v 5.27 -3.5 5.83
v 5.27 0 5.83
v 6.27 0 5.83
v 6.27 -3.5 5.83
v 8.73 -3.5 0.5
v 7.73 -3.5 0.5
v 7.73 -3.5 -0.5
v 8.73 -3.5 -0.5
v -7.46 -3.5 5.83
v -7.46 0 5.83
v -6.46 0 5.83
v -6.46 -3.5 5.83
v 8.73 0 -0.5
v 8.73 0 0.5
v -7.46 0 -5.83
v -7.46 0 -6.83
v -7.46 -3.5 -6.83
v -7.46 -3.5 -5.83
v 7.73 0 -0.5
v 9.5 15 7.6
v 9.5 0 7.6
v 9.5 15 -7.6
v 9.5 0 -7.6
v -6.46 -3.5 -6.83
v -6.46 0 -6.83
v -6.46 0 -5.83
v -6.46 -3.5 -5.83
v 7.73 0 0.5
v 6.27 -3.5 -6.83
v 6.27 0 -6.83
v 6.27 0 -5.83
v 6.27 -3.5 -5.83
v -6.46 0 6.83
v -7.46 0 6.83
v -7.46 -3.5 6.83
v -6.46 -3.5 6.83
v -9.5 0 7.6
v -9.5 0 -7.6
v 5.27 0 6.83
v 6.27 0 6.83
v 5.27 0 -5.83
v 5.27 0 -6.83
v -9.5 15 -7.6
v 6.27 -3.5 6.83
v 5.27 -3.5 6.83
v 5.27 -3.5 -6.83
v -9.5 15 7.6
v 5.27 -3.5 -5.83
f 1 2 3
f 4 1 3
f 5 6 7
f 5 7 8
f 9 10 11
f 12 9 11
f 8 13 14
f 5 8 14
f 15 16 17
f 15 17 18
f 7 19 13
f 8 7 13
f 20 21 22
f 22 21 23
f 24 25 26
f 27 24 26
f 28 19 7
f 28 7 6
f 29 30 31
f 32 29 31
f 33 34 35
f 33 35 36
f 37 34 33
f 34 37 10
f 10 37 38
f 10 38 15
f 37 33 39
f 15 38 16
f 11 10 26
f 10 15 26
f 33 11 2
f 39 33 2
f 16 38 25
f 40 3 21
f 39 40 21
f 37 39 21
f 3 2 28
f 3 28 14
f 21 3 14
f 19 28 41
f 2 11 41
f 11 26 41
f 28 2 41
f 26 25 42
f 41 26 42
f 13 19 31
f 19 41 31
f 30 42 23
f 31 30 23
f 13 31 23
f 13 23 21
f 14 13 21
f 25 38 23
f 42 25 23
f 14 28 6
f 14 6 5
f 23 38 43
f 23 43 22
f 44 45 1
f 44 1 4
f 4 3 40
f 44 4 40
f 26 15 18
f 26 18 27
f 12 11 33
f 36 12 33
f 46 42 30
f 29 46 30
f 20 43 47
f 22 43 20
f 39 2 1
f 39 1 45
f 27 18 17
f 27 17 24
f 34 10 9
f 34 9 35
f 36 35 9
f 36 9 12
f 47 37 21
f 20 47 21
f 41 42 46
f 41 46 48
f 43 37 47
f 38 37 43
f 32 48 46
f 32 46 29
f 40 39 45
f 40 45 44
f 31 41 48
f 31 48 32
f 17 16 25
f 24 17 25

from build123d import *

# Parameters (mm, degrees)
SKETCH_1_W      = 19
SKETCH_1_H      = 15.2
EXTRUDE_1_DEPTH = 15
SKETCH_2_W      = 1
SKETCH_2_H      = 1
EXTRUDE_2_DEPTH = 3.5


with BuildPart() as part:
    # 草图1 → 拉伸1 (new body)
    with BuildSketch(Plane(origin=(0, 0, 0), x_dir=(1, 0, 0), z_dir=(0, 1, 0))):
        Rectangle(SKETCH_1_W, SKETCH_1_H)
    extrude(amount=EXTRUDE_1_DEPTH)

    # 草图2 → 拉伸2 (add)
    with BuildSketch(Plane.XZ):
        with Locations((8.23, 0)):
            Rectangle(SKETCH_2_W, SKETCH_2_H)
        with Locations((5.77, 6.33)):
            Rectangle(SKETCH_2_W, SKETCH_2_H)
        with Locations((-6.96, 6.33)):
            Rectangle(SKETCH_2_W, SKETCH_2_H)
        with Locations((-6.96, -6.33)):
            Rectangle(SKETCH_2_W, SKETCH_2_H)
        with Locations((5.77, -6.33)):
            Rectangle(SKETCH_2_W, SKETCH_2_H)
    extrude(amount=EXTRUDE_2_DEPTH)


solid = part.part
